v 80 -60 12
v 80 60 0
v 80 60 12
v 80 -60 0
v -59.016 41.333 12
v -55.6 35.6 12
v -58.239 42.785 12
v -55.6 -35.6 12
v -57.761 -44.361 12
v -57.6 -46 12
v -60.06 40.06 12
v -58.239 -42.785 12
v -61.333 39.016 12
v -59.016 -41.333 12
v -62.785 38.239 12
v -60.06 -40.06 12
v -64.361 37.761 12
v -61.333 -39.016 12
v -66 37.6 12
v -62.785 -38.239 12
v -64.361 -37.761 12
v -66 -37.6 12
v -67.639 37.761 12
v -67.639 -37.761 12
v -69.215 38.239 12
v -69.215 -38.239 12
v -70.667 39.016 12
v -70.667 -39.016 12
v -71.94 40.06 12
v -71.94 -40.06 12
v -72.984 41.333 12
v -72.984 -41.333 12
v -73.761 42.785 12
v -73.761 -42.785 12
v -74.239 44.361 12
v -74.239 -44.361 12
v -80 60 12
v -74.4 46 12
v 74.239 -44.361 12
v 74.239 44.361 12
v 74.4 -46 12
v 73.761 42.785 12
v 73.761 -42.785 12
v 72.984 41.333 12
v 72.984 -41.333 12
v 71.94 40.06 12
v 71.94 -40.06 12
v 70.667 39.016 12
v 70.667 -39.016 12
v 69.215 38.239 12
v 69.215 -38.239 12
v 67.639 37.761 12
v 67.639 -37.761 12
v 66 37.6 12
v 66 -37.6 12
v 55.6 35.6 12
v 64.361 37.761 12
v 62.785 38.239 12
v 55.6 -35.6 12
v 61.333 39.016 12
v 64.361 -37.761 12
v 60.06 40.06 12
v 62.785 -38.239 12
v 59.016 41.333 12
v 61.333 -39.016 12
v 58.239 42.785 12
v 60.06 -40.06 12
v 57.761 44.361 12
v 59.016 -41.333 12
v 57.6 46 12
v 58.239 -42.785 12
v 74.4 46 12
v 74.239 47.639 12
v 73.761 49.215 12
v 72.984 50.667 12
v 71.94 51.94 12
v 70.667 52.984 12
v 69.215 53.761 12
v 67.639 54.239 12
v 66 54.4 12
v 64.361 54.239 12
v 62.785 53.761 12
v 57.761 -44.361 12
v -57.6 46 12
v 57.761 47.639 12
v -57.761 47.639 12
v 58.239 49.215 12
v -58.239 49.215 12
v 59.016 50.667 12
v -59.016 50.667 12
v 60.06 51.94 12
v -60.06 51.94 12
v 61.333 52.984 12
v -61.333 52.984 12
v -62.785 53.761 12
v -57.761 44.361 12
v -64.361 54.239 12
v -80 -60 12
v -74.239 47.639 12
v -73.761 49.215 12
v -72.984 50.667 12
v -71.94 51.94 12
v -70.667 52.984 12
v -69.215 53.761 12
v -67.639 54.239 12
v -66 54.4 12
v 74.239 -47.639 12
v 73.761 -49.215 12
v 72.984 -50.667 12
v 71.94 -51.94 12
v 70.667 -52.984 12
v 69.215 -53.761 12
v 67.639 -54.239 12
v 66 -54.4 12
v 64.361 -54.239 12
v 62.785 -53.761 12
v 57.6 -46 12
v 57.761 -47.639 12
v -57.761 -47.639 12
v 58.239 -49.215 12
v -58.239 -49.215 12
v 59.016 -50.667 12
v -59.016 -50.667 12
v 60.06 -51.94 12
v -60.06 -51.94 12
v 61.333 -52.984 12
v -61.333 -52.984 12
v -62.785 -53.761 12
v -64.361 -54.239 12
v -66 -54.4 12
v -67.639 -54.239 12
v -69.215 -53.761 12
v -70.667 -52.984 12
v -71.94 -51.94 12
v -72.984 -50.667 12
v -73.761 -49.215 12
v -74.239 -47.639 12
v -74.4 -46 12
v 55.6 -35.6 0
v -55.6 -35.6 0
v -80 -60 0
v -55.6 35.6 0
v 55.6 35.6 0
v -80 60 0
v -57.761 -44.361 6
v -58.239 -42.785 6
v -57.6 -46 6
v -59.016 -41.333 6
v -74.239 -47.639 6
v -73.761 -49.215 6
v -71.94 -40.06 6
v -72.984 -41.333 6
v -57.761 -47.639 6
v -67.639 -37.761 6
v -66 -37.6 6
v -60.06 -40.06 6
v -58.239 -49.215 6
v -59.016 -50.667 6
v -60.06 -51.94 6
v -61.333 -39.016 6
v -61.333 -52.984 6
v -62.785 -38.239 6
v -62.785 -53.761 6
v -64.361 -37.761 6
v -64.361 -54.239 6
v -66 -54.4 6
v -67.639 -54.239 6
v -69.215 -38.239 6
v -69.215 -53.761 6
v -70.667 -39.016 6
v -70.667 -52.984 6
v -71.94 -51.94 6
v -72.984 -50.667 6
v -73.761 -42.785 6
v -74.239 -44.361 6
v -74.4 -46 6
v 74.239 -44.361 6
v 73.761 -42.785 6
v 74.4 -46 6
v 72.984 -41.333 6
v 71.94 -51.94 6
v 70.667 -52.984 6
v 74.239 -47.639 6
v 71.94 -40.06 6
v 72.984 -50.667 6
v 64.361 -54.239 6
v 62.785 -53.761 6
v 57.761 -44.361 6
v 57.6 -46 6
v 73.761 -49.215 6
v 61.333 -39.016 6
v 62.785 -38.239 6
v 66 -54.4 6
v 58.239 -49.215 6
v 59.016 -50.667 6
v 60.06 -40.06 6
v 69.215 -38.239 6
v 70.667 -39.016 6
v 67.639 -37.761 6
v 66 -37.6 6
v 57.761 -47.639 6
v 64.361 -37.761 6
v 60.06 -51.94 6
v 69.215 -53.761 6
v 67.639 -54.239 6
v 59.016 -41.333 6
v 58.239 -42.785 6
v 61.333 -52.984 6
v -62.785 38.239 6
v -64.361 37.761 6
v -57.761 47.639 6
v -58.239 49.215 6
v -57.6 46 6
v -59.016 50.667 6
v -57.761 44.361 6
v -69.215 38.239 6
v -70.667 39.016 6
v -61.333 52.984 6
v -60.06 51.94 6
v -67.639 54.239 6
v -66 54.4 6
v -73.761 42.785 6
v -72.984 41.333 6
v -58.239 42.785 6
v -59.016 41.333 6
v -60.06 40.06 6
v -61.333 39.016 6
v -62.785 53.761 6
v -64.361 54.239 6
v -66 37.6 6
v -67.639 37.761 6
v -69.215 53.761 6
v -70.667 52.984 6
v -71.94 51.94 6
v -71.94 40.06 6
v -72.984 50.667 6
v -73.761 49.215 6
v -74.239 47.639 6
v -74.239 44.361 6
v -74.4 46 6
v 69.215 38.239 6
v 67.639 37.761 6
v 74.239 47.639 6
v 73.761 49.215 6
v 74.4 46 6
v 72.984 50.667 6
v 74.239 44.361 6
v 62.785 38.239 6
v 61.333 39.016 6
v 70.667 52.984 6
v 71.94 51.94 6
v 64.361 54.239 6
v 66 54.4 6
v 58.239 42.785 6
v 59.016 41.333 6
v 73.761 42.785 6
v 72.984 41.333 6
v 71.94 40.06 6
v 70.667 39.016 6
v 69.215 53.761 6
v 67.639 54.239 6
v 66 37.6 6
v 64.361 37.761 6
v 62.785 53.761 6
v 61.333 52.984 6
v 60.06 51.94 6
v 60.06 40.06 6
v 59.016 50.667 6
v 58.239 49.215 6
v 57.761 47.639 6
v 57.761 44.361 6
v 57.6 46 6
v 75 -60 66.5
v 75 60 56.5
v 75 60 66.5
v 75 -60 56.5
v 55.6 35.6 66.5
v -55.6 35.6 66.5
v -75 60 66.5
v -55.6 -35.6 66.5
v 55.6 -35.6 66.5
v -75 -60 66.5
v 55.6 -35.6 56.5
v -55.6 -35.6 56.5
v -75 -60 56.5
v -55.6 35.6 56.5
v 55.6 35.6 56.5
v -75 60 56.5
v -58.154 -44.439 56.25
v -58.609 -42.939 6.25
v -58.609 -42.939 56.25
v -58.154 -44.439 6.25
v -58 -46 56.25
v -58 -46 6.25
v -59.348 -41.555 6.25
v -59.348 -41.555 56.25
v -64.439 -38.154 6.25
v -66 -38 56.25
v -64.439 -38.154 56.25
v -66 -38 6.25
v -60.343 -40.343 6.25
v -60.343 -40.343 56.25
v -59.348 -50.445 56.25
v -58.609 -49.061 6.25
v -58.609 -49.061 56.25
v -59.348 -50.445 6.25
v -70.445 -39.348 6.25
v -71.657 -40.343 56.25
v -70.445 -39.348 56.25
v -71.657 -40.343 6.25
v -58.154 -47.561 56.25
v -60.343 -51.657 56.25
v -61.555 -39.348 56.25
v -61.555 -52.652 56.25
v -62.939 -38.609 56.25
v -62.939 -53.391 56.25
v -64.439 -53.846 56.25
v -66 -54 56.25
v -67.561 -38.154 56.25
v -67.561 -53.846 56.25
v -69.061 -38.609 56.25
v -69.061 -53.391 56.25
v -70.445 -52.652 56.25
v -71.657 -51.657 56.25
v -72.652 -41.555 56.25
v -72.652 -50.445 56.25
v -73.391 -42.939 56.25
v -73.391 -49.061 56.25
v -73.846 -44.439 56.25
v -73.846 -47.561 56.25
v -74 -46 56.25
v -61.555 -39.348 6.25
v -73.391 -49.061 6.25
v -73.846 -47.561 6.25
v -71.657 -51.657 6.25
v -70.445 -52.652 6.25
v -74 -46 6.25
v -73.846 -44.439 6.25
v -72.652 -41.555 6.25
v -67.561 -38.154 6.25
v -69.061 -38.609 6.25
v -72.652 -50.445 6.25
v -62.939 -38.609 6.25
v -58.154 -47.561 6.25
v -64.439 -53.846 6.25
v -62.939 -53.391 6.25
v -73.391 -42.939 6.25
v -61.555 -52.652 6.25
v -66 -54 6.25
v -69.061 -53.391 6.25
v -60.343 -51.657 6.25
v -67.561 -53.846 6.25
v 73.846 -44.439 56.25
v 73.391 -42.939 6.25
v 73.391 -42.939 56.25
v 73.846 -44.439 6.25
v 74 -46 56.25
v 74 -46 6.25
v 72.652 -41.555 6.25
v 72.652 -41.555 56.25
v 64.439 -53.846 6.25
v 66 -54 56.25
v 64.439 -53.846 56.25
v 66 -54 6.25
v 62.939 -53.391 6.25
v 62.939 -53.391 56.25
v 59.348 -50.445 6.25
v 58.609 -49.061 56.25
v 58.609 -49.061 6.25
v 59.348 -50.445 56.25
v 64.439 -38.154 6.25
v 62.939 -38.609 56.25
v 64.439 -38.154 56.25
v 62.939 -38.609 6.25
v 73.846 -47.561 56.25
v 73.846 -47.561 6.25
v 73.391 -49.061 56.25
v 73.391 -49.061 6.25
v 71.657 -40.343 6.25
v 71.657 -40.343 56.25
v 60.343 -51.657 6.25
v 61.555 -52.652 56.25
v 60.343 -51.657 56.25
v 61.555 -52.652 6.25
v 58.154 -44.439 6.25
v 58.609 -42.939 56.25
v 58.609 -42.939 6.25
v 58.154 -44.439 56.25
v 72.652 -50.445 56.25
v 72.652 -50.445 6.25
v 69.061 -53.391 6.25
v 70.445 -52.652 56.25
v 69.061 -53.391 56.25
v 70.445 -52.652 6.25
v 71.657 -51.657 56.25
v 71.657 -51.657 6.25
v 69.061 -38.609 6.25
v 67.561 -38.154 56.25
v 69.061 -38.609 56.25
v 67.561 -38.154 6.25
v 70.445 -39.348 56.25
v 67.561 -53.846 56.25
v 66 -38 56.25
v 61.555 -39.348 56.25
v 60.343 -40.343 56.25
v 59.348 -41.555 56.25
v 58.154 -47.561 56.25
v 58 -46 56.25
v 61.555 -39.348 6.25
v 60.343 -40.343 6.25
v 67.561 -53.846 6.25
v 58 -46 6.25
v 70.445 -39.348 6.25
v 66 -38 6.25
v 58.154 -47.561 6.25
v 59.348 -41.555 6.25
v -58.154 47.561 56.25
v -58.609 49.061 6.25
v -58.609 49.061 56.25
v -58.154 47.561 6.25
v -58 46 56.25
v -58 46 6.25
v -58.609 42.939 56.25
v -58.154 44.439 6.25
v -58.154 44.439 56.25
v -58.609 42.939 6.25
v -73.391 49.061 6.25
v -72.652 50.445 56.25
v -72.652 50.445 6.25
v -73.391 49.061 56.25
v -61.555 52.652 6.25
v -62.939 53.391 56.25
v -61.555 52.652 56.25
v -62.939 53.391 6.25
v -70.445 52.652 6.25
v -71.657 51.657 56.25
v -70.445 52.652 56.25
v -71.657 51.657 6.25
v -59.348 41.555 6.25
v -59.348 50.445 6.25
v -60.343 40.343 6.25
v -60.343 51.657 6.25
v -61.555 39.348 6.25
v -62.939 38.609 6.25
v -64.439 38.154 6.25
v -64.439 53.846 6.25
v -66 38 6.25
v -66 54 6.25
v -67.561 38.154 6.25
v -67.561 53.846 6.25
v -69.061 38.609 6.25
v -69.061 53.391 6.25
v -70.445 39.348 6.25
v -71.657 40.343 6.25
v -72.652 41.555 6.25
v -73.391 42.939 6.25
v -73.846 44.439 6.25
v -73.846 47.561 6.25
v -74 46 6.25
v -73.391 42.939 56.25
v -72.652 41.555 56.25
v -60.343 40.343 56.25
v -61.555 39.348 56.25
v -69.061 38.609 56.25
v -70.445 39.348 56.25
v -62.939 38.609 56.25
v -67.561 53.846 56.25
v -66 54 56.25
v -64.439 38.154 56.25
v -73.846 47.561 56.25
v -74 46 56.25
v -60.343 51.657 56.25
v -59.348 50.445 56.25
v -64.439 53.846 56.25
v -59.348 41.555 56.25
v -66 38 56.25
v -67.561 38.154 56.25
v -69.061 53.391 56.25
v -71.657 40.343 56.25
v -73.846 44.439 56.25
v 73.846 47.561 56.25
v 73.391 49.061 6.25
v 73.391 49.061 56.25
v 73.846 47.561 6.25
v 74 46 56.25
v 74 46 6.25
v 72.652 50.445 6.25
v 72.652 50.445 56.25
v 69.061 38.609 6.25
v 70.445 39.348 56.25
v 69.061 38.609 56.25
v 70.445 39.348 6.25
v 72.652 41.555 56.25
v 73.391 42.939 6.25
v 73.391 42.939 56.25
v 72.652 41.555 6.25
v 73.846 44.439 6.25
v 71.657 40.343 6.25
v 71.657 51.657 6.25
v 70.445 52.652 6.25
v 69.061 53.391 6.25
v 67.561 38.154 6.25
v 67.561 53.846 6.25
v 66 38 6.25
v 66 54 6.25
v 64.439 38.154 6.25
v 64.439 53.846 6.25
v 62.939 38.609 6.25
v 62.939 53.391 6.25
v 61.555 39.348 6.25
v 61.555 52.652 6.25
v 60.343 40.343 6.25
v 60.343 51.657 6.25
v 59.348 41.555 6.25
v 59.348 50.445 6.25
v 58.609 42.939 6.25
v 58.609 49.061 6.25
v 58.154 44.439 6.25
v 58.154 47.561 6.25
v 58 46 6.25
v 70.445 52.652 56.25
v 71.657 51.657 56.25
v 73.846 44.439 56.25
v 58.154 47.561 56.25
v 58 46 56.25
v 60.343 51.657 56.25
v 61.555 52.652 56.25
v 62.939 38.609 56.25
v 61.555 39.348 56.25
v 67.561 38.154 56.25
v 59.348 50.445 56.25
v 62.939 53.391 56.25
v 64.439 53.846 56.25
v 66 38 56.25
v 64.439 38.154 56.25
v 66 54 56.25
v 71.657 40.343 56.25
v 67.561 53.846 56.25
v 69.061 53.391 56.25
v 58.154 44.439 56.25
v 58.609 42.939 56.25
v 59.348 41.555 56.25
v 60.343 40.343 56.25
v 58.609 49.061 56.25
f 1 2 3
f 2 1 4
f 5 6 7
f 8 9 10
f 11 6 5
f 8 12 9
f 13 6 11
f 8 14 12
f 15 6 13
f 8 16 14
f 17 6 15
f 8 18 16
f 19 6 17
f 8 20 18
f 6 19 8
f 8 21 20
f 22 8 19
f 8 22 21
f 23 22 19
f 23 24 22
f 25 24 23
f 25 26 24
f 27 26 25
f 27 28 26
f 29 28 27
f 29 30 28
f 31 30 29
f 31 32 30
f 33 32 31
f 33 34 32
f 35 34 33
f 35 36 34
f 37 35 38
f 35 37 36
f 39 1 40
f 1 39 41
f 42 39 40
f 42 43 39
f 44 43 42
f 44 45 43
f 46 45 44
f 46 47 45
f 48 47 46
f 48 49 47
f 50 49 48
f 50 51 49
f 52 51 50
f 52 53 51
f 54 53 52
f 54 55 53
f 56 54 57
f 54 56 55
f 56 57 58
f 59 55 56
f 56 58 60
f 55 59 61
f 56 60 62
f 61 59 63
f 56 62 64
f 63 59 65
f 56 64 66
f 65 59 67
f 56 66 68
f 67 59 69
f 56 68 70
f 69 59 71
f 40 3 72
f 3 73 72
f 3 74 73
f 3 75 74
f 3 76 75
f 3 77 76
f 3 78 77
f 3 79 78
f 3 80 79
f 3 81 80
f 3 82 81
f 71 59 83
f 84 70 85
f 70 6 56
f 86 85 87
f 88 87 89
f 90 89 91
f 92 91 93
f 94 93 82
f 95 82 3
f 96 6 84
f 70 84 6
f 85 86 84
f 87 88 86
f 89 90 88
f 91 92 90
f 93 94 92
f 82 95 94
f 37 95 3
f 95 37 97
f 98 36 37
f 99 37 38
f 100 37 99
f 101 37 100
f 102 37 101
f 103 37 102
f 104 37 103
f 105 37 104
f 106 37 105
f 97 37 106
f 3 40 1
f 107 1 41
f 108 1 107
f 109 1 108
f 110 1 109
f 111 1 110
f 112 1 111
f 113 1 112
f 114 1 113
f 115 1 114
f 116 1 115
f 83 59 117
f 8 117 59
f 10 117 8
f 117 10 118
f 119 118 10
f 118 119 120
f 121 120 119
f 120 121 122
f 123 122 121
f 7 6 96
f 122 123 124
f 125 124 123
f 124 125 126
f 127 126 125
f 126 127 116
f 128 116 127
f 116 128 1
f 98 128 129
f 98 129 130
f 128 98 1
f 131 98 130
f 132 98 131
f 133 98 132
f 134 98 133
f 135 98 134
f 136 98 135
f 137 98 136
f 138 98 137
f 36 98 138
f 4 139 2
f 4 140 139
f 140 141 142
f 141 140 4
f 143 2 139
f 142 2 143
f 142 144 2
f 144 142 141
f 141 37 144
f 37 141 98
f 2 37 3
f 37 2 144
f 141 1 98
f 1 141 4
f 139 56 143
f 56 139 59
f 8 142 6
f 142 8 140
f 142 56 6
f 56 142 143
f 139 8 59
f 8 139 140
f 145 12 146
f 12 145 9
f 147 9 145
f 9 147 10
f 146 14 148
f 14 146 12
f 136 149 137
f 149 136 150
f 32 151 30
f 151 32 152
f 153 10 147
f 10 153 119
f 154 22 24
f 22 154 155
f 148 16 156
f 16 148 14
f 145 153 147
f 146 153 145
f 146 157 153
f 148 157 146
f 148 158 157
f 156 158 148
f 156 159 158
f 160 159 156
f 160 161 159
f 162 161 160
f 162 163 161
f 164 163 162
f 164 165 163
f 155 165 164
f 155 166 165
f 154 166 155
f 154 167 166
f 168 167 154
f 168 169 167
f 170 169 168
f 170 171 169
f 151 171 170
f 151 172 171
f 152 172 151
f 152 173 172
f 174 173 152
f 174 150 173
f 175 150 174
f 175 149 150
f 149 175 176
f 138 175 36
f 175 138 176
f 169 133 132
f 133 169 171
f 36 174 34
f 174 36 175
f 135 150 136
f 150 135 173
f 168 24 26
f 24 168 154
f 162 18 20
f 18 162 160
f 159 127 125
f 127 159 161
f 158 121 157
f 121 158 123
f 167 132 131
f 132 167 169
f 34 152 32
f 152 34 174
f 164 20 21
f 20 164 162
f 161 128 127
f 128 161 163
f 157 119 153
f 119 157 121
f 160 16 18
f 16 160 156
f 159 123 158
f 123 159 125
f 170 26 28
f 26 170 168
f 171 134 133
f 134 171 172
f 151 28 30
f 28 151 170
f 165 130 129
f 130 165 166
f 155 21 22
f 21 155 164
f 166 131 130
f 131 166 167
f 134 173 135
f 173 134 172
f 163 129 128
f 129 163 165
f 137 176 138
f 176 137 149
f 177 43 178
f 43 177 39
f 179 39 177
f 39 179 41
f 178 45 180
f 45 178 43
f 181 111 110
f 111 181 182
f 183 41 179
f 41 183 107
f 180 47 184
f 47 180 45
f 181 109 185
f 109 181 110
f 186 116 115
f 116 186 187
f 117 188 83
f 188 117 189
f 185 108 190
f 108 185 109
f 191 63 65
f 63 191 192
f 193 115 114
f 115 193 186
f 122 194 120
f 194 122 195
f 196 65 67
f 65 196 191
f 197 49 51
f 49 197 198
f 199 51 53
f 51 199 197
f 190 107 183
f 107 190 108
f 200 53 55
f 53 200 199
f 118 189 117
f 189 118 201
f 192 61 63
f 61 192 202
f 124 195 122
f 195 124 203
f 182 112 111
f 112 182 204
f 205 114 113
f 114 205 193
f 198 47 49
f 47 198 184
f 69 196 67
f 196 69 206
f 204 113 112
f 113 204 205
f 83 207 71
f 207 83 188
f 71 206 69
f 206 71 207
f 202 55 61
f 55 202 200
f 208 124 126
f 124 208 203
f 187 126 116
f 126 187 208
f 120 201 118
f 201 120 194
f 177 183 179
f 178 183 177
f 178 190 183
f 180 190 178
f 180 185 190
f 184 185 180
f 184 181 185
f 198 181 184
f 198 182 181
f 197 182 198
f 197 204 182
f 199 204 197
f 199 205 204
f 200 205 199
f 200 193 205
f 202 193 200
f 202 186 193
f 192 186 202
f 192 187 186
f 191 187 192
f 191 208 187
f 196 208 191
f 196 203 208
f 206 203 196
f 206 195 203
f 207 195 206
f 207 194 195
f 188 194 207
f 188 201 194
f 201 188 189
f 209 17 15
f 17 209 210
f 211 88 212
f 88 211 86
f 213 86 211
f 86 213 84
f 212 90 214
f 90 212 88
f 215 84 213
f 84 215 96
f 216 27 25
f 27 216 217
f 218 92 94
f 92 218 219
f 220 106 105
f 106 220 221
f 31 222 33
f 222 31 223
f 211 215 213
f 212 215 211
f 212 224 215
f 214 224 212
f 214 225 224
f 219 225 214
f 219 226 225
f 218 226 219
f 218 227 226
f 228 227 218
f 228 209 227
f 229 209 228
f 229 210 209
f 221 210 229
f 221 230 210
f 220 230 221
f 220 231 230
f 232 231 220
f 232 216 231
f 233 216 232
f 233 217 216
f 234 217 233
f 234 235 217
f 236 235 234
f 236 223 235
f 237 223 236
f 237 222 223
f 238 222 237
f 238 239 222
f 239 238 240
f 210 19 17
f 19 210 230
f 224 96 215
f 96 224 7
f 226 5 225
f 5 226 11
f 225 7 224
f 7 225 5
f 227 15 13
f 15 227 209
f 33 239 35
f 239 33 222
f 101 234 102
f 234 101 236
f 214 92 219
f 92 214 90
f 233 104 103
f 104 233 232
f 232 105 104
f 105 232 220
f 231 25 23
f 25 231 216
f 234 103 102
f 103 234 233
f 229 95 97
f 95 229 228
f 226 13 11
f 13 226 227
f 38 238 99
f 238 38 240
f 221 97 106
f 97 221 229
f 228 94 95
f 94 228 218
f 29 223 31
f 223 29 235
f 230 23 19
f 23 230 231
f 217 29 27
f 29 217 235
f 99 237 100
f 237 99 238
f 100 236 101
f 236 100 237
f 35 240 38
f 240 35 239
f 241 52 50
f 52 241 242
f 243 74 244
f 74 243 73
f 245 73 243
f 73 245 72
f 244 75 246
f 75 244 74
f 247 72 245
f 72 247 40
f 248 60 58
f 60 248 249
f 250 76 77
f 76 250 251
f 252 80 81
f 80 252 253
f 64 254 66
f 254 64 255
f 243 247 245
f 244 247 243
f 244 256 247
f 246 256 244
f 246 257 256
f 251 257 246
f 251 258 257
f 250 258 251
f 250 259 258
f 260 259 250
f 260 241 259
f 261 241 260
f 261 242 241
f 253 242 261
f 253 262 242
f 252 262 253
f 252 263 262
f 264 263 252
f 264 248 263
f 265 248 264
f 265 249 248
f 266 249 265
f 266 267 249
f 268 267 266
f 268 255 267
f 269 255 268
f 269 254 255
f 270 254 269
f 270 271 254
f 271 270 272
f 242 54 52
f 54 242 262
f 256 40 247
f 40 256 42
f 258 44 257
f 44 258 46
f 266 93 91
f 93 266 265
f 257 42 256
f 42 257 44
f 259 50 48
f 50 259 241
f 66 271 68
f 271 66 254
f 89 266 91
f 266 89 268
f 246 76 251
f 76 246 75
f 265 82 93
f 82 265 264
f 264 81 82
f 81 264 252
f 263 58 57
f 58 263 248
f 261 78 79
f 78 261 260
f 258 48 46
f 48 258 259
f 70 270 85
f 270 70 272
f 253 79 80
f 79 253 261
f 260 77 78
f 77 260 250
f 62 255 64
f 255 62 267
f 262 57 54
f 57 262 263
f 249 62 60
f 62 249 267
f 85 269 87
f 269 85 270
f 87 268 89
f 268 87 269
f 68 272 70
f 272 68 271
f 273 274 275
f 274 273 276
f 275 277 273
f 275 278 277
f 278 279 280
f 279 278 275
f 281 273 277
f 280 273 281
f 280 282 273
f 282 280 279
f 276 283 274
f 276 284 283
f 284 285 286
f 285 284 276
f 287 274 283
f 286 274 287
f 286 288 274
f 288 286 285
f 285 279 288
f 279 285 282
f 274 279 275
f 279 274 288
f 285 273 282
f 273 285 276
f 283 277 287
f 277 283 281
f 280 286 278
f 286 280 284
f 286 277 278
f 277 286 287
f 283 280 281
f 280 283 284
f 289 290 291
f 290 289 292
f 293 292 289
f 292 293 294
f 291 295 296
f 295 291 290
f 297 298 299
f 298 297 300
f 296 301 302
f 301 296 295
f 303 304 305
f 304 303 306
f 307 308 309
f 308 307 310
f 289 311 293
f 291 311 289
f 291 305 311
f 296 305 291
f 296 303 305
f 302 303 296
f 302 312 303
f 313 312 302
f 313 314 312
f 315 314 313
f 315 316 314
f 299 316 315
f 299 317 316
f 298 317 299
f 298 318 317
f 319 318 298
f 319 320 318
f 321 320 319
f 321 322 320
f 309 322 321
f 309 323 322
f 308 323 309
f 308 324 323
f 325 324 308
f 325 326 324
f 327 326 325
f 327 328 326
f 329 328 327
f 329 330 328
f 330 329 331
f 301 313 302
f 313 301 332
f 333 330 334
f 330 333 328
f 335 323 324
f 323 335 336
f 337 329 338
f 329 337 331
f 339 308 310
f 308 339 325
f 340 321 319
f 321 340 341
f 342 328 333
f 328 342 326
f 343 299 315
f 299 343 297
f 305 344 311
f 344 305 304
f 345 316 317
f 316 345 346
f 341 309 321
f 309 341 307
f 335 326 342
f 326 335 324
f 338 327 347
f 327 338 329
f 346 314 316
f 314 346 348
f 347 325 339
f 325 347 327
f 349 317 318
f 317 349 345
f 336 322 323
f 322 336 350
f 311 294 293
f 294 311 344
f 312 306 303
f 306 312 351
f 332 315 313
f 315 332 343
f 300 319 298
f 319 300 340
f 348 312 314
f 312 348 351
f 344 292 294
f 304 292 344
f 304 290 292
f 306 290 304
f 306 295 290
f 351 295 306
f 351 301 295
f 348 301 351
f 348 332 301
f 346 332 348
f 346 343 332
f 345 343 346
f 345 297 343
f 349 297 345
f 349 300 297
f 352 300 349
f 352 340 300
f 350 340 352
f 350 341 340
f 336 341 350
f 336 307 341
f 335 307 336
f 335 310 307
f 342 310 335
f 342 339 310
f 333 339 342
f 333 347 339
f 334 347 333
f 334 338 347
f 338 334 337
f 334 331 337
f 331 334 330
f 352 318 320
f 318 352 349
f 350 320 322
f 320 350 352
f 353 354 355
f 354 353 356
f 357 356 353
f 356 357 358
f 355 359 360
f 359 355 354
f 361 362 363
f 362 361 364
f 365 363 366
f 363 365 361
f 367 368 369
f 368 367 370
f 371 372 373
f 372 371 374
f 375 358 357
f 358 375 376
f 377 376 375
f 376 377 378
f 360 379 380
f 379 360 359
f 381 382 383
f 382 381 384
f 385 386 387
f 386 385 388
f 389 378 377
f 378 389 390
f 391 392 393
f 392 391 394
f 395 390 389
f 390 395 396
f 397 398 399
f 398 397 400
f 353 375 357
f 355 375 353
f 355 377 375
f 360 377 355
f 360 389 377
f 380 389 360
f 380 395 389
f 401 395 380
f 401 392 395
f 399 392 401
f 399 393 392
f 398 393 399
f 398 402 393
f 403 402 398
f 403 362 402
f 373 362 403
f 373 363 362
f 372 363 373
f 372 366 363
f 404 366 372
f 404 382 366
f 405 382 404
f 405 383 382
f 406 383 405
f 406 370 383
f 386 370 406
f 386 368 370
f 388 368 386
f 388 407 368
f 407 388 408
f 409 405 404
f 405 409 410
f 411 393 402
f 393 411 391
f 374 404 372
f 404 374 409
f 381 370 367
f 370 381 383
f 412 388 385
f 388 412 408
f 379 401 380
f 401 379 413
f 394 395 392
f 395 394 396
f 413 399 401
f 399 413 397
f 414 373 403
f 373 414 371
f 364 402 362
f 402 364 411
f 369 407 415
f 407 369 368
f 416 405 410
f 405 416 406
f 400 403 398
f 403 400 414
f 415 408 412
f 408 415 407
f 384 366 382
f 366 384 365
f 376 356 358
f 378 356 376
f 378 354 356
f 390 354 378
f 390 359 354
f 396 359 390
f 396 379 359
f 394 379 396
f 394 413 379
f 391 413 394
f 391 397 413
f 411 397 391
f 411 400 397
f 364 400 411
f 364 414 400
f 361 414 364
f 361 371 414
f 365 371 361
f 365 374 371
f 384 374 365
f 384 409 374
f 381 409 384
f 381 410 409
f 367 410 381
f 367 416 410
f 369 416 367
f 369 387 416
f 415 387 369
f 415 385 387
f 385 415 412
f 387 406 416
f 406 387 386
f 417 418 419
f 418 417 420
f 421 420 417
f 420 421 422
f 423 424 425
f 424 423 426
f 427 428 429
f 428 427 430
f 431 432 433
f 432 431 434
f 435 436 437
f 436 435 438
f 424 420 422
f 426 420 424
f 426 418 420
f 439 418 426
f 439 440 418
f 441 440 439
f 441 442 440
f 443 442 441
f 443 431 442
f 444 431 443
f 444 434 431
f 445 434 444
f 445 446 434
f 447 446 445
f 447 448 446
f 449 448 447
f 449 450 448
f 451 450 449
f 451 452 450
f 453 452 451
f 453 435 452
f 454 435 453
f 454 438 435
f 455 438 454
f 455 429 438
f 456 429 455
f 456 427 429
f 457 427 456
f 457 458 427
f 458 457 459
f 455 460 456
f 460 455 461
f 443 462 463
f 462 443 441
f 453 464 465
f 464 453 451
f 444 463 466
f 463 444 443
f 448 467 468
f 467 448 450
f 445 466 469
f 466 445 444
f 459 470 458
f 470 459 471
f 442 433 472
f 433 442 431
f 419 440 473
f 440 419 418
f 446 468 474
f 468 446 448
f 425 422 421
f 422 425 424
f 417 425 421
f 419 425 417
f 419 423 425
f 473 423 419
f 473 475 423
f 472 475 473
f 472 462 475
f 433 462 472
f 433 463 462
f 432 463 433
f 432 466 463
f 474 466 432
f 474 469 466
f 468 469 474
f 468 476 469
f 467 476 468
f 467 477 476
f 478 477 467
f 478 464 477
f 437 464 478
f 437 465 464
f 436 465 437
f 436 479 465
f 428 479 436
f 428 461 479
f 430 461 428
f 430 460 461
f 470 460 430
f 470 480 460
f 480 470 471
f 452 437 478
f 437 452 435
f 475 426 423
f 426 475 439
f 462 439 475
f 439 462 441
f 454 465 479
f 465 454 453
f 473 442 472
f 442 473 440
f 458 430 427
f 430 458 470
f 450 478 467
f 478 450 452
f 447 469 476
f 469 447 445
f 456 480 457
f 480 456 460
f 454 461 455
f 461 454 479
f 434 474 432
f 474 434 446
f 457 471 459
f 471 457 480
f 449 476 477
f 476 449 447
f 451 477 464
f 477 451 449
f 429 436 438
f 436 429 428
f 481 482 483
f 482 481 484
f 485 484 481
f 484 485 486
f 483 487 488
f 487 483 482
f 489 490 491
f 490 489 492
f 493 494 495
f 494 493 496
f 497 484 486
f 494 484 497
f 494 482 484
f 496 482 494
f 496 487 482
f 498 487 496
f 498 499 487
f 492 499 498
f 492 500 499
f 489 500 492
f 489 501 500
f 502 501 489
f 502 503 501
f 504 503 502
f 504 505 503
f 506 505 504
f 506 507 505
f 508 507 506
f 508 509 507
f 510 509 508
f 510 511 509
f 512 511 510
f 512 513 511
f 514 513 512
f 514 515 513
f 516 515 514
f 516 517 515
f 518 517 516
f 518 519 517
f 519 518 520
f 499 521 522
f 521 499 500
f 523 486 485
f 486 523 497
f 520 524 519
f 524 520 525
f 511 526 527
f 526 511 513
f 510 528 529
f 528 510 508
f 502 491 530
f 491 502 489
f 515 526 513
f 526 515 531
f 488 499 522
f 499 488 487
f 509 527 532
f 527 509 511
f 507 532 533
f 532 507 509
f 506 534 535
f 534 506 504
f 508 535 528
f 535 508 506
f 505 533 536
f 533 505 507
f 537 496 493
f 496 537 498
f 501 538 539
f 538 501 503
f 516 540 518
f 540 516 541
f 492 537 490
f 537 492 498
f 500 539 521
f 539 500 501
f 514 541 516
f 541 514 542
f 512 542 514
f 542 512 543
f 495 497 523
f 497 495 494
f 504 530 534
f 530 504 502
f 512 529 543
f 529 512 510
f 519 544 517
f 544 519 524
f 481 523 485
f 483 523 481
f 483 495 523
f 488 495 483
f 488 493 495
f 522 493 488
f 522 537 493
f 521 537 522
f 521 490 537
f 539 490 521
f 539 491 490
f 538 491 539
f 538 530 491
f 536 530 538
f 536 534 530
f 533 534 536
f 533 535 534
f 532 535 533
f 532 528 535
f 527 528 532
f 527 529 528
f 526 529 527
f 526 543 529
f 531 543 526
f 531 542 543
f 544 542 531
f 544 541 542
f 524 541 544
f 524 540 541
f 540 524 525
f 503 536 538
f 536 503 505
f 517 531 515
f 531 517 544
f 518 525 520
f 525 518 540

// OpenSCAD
$fn = 32;

// ------------------------------------------------------------------------
// Frame cube: base 160 x 120 mm, posts 50 mm tall
// Every part is its own module, assembly() places every instance.
// ------------------------------------------------------------------------

// --- part 1 ---
module base_frame() {
  difference() {
    translate([-80, -60, 0]) cube([160, 120, 12]);
    translate([-55.6, -35.6, -1]) cube([111.2, 71.2, 14]);
    translate([-66, -46, 6]) cylinder(h = 7, d = 16.8);
    translate([66, -46, 6]) cylinder(h = 7, d = 16.8);
    translate([-66, 46, 6]) cylinder(h = 7, d = 16.8);
    translate([66, 46, 6]) cylinder(h = 7, d = 16.8);
  }
}

// --- part 2 ---
module corner_post() {
  cylinder(h = 50, d = 16);
}

// --- part 3 ---
module top_frame() {
  difference() {
    translate([-75, -60, 0]) cube([150, 120, 10]);
    translate([-55.6, -35.6, -1]) cube([111.2, 71.2, 12]);
  }
}

// --- assembly ---
module assembly() {
  color([0.80, 0.24, 0.20]) translate([0, 0, 0]) rotate([0, 0, 0]) base_frame();
  color([0.20, 0.45, 0.75]) translate([-66, -46, 6.25]) rotate([0, 0, 0]) corner_post();
  color([0.25, 0.62, 0.32]) translate([66, -46, 6.25]) rotate([0, 0, 0]) corner_post();
  color([0.92, 0.70, 0.18]) translate([-66, 46, 6.25]) rotate([0, 0, 0]) corner_post();
  color([0.58, 0.35, 0.70]) translate([66, 46, 6.25]) rotate([0, 0, 0]) corner_post();
  color([0.16, 0.66, 0.66]) translate([0, 0, 56.5]) rotate([0, 0, 0]) top_frame();
}

assembly();
